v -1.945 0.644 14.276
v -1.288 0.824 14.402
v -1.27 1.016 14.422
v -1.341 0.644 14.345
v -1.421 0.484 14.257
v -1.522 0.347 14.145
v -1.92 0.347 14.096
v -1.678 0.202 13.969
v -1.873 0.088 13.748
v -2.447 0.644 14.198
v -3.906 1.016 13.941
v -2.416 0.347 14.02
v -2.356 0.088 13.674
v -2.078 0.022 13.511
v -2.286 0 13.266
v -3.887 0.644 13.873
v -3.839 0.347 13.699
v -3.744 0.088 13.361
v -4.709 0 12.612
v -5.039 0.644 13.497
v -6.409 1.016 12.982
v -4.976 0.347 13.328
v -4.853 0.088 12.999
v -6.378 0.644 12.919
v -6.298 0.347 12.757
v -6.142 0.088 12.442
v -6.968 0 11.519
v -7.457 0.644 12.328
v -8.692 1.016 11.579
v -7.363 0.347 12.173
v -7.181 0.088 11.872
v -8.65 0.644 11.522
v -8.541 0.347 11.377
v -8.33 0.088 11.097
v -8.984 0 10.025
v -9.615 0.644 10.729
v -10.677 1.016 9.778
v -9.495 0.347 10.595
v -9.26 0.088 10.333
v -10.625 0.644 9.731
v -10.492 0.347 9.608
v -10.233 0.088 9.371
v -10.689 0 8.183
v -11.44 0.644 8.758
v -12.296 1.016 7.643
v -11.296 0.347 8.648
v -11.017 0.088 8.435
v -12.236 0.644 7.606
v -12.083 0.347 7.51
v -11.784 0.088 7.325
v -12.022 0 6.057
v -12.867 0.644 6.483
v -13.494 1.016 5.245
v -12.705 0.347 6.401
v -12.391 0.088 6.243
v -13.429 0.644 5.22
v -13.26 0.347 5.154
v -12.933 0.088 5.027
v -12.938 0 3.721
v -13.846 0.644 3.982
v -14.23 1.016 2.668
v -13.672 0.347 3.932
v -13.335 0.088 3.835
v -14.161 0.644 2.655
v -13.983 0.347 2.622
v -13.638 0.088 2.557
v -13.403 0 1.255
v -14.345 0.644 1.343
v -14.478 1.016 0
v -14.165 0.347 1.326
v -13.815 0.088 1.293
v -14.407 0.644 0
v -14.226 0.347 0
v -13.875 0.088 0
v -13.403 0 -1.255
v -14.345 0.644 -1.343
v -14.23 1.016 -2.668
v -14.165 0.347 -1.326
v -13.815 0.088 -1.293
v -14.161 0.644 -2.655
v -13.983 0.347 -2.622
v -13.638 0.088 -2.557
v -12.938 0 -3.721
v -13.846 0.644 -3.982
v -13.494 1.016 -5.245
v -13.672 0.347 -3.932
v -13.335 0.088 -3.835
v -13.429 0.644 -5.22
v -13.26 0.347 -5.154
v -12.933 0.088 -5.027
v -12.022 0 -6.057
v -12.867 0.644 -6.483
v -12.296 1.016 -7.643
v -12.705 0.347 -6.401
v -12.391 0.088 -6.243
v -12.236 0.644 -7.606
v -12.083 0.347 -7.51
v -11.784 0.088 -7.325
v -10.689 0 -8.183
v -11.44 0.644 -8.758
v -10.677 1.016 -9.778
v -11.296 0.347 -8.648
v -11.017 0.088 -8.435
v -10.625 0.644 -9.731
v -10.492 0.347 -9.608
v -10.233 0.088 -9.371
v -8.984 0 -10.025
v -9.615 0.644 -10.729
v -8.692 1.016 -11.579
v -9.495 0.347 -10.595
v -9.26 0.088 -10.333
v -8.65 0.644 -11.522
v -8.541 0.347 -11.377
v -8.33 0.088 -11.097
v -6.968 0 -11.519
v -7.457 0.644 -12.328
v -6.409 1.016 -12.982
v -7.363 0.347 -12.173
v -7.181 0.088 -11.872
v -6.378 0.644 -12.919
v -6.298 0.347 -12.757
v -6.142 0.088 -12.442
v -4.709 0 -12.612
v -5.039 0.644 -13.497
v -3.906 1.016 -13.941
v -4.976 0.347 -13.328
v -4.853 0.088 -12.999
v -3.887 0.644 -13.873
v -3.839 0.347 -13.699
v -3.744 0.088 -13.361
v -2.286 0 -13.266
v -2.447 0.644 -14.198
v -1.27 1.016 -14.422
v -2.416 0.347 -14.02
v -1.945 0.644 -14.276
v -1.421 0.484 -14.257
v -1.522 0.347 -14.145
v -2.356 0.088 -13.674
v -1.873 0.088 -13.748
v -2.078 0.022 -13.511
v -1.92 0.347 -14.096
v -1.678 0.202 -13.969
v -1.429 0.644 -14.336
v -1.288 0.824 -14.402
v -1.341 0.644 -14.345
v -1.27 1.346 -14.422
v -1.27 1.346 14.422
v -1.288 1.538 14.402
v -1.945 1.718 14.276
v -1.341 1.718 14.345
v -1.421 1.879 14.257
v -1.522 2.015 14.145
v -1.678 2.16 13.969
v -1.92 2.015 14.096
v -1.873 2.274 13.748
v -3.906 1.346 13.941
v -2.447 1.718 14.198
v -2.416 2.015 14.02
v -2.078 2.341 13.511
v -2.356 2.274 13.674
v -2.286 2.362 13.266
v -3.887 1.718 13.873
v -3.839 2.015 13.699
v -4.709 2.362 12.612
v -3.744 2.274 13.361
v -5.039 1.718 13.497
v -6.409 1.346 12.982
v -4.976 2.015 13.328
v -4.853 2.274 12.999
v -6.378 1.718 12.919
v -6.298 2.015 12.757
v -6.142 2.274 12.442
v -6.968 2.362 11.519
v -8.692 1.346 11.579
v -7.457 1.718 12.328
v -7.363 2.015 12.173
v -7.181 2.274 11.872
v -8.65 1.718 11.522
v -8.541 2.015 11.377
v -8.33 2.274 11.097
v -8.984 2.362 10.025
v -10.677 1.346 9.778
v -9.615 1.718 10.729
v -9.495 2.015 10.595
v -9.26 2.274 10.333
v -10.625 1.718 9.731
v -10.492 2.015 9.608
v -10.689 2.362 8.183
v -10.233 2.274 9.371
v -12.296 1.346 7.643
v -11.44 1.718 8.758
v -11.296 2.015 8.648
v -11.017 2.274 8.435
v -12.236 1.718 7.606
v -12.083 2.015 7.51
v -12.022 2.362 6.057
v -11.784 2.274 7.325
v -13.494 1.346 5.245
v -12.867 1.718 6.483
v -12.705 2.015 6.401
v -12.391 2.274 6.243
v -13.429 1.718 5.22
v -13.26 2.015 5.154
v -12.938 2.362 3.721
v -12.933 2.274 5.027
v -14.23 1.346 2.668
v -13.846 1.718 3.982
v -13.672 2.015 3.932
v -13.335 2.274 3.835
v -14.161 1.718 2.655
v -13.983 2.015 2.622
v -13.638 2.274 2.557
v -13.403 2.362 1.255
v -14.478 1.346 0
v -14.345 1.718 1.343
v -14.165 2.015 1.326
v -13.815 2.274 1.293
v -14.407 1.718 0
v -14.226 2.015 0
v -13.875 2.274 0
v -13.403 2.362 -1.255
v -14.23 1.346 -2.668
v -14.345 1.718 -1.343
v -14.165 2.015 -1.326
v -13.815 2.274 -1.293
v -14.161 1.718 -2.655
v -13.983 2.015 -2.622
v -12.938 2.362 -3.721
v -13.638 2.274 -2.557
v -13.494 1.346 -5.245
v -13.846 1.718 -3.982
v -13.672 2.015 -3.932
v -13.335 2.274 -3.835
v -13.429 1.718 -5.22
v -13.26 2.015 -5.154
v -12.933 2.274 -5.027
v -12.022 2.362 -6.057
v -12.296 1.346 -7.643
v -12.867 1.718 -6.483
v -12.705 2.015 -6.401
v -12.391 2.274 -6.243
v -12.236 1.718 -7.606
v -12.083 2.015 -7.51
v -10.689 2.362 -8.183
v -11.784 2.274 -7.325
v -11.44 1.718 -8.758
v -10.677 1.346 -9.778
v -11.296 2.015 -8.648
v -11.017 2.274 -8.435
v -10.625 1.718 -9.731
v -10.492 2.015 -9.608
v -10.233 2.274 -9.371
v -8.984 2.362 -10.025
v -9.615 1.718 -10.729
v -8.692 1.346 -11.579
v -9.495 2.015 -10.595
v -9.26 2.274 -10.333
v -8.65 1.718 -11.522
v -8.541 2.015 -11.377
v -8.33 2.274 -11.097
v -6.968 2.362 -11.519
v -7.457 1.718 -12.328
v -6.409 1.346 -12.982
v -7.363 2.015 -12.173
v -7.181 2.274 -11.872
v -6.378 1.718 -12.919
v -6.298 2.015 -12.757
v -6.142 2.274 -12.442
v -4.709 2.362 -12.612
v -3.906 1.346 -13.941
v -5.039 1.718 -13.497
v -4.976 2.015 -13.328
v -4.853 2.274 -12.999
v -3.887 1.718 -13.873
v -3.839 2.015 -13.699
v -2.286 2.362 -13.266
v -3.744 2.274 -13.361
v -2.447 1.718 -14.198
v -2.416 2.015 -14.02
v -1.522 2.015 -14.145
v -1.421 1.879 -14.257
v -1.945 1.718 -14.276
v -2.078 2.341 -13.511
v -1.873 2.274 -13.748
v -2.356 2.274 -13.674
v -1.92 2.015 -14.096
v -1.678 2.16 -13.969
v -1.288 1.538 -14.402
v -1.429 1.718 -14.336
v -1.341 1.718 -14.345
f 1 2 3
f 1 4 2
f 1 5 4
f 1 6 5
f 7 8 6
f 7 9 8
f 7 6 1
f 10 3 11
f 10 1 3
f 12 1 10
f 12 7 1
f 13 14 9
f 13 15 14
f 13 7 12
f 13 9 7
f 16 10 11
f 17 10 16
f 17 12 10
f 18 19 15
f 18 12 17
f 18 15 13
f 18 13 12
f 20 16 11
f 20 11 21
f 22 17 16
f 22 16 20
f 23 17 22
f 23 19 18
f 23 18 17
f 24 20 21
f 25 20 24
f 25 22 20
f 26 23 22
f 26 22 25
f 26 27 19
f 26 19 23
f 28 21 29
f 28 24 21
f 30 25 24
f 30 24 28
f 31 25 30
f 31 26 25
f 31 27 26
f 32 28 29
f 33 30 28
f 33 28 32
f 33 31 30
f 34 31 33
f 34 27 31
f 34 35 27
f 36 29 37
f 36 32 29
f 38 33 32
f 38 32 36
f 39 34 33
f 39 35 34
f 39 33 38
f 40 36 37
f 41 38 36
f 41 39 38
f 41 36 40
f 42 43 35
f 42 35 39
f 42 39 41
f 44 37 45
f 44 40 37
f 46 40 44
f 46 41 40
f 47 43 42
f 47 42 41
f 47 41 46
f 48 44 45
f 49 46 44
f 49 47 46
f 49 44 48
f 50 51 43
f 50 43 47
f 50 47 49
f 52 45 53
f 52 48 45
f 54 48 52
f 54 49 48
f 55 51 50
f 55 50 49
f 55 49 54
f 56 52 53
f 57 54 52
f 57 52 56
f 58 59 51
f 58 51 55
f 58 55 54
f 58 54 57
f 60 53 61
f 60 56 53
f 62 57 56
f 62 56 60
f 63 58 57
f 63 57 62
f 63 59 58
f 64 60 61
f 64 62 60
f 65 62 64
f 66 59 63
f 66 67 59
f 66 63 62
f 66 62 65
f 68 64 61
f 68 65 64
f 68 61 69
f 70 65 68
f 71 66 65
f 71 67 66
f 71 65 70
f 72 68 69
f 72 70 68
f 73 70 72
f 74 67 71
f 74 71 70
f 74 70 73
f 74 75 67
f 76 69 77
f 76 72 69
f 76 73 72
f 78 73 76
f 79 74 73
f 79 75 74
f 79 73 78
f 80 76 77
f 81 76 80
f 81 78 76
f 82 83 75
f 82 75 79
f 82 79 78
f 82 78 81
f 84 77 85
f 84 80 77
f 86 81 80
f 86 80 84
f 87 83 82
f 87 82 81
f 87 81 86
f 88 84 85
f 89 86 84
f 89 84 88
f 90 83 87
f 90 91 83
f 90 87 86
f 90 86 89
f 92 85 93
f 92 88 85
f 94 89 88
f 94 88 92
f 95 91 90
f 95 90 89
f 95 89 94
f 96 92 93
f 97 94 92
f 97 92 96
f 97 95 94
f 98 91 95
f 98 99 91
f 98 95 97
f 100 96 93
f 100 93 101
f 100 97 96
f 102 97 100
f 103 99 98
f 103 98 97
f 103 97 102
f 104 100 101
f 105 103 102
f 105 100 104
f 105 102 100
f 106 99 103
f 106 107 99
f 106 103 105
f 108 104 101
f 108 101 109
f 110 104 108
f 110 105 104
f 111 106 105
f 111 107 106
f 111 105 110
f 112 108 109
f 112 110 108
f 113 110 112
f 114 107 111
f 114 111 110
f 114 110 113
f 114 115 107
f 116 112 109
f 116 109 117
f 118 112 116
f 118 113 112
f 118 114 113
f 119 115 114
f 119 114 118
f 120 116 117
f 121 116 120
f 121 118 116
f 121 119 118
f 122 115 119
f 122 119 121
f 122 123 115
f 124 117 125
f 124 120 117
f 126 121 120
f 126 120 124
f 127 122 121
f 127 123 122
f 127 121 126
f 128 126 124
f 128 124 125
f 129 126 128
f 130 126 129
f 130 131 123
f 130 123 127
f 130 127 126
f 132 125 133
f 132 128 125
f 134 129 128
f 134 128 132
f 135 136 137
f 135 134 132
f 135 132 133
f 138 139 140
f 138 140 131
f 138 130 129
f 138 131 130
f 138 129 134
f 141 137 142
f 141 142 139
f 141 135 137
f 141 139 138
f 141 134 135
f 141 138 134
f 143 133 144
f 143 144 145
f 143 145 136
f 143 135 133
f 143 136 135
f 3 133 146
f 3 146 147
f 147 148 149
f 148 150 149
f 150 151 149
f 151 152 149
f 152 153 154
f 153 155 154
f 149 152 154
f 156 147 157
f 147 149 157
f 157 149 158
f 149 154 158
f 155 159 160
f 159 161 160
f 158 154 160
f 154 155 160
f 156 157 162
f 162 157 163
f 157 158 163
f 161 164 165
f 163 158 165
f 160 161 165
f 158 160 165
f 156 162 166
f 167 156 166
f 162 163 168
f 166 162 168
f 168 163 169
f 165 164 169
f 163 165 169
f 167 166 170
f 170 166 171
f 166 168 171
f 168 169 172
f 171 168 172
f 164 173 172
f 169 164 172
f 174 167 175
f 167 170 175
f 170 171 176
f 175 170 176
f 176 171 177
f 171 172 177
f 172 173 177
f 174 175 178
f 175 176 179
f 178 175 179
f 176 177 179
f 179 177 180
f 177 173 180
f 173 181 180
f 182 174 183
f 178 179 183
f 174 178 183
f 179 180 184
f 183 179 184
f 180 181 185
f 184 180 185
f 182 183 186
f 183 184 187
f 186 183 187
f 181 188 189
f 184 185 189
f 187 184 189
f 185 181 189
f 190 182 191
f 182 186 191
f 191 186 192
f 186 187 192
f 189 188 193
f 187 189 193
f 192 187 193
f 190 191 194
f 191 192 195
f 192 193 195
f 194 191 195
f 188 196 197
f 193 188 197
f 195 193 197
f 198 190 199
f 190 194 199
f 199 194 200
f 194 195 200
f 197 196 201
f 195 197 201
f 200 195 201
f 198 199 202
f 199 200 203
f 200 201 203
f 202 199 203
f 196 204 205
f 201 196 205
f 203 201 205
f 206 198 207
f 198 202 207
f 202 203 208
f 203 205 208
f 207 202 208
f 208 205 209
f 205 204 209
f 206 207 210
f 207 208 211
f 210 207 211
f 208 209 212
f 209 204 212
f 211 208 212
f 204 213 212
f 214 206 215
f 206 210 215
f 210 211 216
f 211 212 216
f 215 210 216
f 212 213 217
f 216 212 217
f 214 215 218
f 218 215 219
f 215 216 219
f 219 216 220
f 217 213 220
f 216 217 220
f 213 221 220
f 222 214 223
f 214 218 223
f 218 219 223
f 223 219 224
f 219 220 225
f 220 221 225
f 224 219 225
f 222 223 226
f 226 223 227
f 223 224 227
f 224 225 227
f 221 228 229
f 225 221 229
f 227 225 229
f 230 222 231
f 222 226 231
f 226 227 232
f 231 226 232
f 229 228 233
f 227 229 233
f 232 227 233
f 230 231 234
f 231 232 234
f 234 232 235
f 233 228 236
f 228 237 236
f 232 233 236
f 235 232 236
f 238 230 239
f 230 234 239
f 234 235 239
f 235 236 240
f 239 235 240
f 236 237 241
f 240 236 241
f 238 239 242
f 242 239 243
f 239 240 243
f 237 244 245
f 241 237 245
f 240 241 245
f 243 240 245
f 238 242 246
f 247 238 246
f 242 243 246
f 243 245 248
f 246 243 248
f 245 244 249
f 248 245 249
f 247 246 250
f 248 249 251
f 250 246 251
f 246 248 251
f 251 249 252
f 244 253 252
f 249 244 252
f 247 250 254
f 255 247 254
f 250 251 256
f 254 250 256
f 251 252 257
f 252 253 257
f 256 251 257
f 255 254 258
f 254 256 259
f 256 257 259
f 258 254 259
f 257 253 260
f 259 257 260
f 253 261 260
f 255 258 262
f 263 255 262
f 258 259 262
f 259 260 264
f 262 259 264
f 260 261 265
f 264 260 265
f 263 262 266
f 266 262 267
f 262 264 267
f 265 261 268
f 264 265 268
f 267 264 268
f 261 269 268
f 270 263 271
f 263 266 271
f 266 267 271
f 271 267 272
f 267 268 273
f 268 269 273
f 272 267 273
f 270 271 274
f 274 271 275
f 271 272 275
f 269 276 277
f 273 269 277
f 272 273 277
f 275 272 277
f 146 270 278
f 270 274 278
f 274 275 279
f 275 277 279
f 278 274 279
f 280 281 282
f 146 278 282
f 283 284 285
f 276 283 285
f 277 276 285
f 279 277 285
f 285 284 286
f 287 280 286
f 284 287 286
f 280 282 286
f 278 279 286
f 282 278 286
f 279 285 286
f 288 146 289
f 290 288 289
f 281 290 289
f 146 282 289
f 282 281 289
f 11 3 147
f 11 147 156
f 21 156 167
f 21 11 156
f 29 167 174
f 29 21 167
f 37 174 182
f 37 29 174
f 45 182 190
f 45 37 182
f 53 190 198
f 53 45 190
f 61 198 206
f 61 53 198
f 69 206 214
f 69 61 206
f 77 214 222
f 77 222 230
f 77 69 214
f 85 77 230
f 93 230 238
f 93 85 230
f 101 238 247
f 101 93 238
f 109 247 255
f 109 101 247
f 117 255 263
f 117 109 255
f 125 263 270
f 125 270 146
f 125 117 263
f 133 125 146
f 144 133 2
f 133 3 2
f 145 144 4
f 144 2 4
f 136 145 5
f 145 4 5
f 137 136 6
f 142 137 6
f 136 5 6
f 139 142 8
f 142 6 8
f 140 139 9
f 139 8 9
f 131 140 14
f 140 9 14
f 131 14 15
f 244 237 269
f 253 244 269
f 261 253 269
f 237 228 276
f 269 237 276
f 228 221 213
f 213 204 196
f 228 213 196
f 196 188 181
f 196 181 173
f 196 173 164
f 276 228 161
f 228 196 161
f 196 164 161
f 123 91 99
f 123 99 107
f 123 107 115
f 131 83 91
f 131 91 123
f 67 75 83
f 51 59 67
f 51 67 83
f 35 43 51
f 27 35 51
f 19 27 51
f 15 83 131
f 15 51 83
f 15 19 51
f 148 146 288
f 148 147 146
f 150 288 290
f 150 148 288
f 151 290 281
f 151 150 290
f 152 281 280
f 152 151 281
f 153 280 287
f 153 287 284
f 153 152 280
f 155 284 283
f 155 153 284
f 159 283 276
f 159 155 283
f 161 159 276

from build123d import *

# Parameters (mm, degrees)
F1_DEPTH = 2.3622
F2_R     = 1.016


with BuildPart() as f1:
    # F0 (on Front) → F1 (new body)
    with BuildSketch(Plane.XZ):
        with BuildLine():
            Line((-1.27, -14.4221906796), (-1.27, 14.4221906796))
            ThreePointArc((-1.27, 14.4221906796), (-14.478, 0), (-1.27, -14.4221906796))
        make_face()
    extrude(amount=-F1_DEPTH)

    # F2
    f2_edges = [f1.edges().sort_by_distance(p)[0] for p in [
        (-14.478, 0, 0),
        (-1.27, 0, 0),
        (-14.478, 2.3622, 0),
        (-1.27, 2.3622, 0),
    ]]
    fillet(f2_edges, radius=F2_R)


solid = f1.part
